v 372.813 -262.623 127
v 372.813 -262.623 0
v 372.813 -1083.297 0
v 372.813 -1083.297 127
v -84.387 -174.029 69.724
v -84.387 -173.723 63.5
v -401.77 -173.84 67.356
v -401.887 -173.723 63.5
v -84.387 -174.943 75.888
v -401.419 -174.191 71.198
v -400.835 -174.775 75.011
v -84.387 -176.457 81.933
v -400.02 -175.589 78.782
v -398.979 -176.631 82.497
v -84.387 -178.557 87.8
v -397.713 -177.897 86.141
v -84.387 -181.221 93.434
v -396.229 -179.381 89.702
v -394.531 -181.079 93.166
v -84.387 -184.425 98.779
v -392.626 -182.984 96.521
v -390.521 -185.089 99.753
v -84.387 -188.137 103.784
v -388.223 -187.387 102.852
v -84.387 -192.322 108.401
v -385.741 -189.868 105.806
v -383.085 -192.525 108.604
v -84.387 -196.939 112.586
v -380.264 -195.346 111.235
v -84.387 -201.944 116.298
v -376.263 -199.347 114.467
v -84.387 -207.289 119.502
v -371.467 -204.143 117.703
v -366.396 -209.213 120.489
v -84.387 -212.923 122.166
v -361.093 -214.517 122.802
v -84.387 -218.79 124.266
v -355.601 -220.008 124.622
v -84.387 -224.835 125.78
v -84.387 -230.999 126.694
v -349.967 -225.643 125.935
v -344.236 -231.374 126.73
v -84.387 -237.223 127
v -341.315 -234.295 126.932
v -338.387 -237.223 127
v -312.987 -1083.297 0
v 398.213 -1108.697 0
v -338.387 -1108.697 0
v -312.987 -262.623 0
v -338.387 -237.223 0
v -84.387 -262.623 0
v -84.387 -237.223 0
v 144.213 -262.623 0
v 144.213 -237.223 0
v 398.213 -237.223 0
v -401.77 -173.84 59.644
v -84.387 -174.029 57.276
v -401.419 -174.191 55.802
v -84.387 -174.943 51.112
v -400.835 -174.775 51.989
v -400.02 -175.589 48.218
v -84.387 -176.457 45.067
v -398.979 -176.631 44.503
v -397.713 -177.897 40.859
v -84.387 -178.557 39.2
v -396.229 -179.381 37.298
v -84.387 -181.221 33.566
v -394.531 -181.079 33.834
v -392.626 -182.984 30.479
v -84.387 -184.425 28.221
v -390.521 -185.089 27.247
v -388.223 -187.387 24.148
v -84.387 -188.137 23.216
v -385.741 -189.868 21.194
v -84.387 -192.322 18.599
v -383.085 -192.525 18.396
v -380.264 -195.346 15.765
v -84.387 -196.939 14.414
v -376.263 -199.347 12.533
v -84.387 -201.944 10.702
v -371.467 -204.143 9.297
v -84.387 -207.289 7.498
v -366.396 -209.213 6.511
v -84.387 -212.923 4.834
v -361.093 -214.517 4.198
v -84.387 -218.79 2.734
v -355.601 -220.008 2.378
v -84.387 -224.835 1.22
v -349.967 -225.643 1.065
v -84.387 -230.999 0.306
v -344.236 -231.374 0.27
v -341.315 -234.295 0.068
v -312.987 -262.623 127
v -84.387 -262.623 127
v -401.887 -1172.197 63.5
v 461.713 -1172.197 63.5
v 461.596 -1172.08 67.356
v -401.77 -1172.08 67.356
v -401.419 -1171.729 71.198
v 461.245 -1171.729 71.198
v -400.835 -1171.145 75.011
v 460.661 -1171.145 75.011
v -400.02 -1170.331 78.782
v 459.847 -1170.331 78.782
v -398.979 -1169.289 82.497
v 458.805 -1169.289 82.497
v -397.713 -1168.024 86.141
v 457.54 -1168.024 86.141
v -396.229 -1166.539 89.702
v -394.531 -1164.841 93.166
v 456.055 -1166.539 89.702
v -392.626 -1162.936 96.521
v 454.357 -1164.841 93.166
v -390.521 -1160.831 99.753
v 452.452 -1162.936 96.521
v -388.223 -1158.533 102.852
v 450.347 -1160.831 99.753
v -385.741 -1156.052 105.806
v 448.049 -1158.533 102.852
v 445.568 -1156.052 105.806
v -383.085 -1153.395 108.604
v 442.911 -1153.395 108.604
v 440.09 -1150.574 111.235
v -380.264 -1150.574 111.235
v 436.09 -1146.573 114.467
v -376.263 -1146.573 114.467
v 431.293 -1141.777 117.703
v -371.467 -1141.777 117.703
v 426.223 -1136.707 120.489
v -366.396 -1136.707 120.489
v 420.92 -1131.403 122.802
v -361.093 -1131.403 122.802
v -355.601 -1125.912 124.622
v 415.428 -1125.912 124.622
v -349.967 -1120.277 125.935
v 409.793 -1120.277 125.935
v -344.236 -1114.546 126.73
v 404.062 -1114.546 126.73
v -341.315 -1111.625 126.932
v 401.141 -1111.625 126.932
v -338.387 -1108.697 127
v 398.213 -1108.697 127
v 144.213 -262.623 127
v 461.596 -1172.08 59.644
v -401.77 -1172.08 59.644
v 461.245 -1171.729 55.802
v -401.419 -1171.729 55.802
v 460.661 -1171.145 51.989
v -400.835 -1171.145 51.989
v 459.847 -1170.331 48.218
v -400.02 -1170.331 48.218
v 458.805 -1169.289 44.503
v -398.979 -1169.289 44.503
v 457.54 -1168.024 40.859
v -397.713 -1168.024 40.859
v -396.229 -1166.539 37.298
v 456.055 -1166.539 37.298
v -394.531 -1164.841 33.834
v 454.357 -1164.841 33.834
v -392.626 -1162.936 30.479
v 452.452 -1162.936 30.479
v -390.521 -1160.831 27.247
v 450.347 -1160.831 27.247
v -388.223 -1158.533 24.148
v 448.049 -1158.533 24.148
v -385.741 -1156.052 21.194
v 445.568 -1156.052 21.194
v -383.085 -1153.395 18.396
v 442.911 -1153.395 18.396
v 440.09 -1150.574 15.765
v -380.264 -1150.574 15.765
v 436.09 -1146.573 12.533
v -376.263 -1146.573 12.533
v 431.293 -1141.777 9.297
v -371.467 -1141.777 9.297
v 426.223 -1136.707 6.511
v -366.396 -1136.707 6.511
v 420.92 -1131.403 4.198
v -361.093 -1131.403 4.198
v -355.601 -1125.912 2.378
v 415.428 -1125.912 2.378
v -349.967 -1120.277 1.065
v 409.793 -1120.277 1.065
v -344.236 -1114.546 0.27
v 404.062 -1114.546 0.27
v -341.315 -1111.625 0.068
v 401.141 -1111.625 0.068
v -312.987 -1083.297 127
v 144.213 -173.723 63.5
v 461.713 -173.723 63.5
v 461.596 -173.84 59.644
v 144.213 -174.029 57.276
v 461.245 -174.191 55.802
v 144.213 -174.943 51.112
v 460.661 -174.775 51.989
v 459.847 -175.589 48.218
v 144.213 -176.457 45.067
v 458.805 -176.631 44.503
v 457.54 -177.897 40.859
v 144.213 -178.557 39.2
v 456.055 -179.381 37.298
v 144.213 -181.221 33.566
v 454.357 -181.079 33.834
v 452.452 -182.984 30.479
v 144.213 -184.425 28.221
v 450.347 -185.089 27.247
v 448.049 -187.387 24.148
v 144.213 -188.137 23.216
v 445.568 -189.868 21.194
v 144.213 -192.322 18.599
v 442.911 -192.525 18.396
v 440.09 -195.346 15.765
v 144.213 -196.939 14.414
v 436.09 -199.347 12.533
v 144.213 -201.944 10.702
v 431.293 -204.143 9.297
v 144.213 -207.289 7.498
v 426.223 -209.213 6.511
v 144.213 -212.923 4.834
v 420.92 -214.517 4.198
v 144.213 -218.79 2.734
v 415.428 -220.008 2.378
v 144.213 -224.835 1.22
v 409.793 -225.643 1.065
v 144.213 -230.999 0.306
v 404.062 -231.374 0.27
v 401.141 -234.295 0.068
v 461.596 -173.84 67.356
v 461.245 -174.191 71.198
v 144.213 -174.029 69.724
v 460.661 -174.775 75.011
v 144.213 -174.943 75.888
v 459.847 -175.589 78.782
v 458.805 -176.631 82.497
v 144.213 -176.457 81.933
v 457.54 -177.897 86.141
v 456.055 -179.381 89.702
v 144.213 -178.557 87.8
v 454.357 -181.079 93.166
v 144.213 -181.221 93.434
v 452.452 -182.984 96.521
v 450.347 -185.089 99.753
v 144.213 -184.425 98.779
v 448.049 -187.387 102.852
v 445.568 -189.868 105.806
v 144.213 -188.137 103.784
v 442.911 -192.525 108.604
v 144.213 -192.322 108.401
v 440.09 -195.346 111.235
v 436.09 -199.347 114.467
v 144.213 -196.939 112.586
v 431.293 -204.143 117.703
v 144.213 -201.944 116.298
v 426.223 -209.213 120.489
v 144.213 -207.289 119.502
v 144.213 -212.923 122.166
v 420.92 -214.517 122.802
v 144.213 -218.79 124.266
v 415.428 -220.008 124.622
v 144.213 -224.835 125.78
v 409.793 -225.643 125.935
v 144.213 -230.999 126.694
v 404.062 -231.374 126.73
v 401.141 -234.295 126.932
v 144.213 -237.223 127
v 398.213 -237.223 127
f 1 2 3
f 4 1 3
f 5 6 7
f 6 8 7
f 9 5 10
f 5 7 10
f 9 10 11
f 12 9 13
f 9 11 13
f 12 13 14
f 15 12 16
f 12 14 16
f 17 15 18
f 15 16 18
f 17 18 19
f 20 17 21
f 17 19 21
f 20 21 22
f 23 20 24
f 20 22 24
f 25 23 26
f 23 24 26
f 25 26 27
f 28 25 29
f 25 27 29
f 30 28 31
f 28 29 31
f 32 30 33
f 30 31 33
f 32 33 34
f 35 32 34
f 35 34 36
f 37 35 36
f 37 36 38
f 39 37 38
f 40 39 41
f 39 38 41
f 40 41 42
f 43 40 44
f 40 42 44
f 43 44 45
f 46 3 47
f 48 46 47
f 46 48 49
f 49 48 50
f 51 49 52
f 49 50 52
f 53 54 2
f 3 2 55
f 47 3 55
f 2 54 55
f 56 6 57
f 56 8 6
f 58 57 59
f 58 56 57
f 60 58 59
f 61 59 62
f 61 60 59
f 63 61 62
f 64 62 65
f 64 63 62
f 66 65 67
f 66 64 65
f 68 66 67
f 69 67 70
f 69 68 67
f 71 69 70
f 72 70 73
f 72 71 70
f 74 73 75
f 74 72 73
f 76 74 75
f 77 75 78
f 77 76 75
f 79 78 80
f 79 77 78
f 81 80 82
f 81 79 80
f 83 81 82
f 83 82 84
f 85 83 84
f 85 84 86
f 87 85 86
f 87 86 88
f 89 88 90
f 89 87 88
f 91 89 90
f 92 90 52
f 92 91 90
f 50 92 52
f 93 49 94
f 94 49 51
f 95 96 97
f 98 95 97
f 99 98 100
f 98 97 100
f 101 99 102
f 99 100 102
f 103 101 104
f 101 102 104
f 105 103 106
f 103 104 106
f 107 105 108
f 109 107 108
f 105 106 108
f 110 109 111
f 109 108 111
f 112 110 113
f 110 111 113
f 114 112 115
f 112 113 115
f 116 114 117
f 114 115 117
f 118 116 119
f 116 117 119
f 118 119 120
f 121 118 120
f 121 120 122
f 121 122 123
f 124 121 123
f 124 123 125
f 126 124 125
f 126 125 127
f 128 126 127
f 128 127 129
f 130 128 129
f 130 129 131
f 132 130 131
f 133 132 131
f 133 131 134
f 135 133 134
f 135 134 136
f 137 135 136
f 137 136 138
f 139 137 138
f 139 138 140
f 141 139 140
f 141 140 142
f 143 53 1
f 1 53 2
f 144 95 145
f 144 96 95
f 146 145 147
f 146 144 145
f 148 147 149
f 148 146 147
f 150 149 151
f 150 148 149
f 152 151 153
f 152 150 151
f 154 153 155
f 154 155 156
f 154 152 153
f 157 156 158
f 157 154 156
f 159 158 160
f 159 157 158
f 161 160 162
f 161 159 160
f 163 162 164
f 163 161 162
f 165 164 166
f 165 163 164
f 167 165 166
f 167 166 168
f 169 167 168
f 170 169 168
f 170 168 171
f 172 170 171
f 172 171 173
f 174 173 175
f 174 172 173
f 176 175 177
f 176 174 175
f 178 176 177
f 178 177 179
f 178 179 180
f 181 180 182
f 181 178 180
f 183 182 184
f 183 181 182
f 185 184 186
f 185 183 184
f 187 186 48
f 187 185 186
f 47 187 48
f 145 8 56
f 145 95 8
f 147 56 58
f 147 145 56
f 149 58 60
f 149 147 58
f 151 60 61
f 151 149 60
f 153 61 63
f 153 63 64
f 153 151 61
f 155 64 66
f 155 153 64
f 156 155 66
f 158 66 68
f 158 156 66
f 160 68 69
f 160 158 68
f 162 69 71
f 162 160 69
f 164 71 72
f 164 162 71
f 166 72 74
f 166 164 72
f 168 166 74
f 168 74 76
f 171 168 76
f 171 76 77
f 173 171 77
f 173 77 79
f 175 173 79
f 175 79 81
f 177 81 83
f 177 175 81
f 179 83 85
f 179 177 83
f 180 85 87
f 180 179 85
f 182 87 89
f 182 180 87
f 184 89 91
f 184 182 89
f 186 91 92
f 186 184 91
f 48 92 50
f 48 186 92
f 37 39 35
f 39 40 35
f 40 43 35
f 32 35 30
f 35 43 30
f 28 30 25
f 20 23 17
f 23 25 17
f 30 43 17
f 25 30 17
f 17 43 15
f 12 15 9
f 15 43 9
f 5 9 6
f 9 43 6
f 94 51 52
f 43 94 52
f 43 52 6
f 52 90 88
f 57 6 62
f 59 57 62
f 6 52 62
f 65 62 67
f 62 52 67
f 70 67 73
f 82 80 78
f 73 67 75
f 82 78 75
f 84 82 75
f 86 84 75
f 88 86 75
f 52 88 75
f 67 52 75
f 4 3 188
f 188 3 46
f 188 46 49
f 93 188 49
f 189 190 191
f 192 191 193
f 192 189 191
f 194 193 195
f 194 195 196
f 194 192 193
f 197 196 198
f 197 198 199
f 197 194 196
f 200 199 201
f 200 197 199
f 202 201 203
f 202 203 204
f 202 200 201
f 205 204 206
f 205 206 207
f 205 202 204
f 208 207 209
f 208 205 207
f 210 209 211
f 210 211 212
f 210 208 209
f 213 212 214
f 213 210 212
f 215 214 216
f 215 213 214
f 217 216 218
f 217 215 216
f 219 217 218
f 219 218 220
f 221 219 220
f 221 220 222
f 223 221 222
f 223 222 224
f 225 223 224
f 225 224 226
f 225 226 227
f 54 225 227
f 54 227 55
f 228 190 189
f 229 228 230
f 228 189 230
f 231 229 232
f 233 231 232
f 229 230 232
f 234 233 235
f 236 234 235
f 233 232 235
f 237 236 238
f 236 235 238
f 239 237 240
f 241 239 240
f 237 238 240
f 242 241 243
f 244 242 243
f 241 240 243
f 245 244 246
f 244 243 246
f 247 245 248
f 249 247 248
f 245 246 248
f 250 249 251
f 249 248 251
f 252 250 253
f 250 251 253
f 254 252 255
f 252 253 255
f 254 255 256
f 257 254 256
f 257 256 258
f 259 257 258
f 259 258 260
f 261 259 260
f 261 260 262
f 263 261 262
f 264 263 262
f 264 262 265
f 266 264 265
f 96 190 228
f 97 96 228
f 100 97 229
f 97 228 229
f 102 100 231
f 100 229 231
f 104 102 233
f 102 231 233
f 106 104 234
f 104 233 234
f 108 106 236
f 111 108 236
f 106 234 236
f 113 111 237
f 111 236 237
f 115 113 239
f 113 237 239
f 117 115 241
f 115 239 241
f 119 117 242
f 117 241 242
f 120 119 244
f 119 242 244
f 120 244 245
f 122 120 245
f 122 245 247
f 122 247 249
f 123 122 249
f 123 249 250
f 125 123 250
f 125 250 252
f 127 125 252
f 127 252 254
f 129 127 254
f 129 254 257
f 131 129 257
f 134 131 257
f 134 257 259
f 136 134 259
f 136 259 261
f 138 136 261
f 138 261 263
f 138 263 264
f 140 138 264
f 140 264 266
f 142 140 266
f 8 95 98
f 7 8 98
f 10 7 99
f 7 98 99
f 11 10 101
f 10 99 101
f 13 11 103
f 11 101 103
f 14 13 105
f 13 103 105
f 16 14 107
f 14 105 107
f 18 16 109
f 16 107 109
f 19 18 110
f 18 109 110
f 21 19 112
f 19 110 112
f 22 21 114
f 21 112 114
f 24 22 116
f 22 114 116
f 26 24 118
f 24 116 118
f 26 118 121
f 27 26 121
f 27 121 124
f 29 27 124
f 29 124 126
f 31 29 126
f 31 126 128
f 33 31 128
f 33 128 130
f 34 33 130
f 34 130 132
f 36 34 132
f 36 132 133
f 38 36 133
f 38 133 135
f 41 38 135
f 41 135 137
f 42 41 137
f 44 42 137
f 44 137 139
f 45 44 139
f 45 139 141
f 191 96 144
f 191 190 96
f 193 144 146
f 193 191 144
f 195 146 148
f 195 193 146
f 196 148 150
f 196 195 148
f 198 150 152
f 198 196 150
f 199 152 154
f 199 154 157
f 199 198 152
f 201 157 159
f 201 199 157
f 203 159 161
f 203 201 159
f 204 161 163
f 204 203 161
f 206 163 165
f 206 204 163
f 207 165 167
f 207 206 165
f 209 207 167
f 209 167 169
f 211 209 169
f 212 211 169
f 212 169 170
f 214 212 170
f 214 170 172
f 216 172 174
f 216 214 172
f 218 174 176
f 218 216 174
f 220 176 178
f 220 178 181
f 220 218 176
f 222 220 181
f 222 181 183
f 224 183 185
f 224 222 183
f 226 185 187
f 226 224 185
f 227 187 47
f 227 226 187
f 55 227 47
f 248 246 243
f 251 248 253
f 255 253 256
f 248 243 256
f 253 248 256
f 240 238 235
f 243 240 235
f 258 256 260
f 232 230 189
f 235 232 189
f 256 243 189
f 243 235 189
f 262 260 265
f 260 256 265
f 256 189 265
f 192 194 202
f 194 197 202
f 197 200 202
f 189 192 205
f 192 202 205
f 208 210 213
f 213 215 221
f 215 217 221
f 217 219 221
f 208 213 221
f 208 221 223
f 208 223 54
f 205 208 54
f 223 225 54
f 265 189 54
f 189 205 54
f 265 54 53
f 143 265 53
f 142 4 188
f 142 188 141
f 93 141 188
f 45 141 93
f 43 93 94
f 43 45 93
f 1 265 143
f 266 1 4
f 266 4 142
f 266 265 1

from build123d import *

# Parameters (mm, degrees)
BOSS_EXTRUDE1_DEPTH = 127
FILLET2_R           = 63.5


with BuildPart() as part:
    # Sketch1 → Boss-Extrude1 (new body)
    with BuildSketch(Plane.XY):
        Polygon((-84.386835568, -262.623028831), (-84.386835568, -173.723028831), (-401.886835568, -173.723028831), (-401.886835568, -1172.197028831), (461.713164432, -1172.197028831), (461.713164432, -173.723028831), (144.213164432, -173.723028831), (144.213164432, -262.623028831), (372.813164432, -262.623028831), (372.813164432, -1083.297028831), (-312.986835568, -1083.297028831), (-312.986835568, -262.623028831), align=None)
    extrude(amount=BOSS_EXTRUDE1_DEPTH)

    # Fillet2
    fillet2_edges = [part.edges().sort_by_distance(p)[0] for p in [
        (302.963164432, -173.723028831, 0),
        (302.963164432, -173.723028831, 127),
        (-243.136835568, -173.723028831, 0),
        (-243.136835568, -173.723028831, 127),
        (-401.886835568, -672.960028831, 127),
        (-401.886835568, -672.960028831, 0),
        (461.713164432, -672.960028831, 127),
        (461.713164432, -672.960028831, 0),
        (29.913164432, -1172.197028831, 0),
        (29.913164432, -1172.197028831, 127),
    ]]
    fillet(fillet2_edges, radius=FILLET2_R - 0.0001)  # a hair under: the kernel refuses the full size


solid = part.part
